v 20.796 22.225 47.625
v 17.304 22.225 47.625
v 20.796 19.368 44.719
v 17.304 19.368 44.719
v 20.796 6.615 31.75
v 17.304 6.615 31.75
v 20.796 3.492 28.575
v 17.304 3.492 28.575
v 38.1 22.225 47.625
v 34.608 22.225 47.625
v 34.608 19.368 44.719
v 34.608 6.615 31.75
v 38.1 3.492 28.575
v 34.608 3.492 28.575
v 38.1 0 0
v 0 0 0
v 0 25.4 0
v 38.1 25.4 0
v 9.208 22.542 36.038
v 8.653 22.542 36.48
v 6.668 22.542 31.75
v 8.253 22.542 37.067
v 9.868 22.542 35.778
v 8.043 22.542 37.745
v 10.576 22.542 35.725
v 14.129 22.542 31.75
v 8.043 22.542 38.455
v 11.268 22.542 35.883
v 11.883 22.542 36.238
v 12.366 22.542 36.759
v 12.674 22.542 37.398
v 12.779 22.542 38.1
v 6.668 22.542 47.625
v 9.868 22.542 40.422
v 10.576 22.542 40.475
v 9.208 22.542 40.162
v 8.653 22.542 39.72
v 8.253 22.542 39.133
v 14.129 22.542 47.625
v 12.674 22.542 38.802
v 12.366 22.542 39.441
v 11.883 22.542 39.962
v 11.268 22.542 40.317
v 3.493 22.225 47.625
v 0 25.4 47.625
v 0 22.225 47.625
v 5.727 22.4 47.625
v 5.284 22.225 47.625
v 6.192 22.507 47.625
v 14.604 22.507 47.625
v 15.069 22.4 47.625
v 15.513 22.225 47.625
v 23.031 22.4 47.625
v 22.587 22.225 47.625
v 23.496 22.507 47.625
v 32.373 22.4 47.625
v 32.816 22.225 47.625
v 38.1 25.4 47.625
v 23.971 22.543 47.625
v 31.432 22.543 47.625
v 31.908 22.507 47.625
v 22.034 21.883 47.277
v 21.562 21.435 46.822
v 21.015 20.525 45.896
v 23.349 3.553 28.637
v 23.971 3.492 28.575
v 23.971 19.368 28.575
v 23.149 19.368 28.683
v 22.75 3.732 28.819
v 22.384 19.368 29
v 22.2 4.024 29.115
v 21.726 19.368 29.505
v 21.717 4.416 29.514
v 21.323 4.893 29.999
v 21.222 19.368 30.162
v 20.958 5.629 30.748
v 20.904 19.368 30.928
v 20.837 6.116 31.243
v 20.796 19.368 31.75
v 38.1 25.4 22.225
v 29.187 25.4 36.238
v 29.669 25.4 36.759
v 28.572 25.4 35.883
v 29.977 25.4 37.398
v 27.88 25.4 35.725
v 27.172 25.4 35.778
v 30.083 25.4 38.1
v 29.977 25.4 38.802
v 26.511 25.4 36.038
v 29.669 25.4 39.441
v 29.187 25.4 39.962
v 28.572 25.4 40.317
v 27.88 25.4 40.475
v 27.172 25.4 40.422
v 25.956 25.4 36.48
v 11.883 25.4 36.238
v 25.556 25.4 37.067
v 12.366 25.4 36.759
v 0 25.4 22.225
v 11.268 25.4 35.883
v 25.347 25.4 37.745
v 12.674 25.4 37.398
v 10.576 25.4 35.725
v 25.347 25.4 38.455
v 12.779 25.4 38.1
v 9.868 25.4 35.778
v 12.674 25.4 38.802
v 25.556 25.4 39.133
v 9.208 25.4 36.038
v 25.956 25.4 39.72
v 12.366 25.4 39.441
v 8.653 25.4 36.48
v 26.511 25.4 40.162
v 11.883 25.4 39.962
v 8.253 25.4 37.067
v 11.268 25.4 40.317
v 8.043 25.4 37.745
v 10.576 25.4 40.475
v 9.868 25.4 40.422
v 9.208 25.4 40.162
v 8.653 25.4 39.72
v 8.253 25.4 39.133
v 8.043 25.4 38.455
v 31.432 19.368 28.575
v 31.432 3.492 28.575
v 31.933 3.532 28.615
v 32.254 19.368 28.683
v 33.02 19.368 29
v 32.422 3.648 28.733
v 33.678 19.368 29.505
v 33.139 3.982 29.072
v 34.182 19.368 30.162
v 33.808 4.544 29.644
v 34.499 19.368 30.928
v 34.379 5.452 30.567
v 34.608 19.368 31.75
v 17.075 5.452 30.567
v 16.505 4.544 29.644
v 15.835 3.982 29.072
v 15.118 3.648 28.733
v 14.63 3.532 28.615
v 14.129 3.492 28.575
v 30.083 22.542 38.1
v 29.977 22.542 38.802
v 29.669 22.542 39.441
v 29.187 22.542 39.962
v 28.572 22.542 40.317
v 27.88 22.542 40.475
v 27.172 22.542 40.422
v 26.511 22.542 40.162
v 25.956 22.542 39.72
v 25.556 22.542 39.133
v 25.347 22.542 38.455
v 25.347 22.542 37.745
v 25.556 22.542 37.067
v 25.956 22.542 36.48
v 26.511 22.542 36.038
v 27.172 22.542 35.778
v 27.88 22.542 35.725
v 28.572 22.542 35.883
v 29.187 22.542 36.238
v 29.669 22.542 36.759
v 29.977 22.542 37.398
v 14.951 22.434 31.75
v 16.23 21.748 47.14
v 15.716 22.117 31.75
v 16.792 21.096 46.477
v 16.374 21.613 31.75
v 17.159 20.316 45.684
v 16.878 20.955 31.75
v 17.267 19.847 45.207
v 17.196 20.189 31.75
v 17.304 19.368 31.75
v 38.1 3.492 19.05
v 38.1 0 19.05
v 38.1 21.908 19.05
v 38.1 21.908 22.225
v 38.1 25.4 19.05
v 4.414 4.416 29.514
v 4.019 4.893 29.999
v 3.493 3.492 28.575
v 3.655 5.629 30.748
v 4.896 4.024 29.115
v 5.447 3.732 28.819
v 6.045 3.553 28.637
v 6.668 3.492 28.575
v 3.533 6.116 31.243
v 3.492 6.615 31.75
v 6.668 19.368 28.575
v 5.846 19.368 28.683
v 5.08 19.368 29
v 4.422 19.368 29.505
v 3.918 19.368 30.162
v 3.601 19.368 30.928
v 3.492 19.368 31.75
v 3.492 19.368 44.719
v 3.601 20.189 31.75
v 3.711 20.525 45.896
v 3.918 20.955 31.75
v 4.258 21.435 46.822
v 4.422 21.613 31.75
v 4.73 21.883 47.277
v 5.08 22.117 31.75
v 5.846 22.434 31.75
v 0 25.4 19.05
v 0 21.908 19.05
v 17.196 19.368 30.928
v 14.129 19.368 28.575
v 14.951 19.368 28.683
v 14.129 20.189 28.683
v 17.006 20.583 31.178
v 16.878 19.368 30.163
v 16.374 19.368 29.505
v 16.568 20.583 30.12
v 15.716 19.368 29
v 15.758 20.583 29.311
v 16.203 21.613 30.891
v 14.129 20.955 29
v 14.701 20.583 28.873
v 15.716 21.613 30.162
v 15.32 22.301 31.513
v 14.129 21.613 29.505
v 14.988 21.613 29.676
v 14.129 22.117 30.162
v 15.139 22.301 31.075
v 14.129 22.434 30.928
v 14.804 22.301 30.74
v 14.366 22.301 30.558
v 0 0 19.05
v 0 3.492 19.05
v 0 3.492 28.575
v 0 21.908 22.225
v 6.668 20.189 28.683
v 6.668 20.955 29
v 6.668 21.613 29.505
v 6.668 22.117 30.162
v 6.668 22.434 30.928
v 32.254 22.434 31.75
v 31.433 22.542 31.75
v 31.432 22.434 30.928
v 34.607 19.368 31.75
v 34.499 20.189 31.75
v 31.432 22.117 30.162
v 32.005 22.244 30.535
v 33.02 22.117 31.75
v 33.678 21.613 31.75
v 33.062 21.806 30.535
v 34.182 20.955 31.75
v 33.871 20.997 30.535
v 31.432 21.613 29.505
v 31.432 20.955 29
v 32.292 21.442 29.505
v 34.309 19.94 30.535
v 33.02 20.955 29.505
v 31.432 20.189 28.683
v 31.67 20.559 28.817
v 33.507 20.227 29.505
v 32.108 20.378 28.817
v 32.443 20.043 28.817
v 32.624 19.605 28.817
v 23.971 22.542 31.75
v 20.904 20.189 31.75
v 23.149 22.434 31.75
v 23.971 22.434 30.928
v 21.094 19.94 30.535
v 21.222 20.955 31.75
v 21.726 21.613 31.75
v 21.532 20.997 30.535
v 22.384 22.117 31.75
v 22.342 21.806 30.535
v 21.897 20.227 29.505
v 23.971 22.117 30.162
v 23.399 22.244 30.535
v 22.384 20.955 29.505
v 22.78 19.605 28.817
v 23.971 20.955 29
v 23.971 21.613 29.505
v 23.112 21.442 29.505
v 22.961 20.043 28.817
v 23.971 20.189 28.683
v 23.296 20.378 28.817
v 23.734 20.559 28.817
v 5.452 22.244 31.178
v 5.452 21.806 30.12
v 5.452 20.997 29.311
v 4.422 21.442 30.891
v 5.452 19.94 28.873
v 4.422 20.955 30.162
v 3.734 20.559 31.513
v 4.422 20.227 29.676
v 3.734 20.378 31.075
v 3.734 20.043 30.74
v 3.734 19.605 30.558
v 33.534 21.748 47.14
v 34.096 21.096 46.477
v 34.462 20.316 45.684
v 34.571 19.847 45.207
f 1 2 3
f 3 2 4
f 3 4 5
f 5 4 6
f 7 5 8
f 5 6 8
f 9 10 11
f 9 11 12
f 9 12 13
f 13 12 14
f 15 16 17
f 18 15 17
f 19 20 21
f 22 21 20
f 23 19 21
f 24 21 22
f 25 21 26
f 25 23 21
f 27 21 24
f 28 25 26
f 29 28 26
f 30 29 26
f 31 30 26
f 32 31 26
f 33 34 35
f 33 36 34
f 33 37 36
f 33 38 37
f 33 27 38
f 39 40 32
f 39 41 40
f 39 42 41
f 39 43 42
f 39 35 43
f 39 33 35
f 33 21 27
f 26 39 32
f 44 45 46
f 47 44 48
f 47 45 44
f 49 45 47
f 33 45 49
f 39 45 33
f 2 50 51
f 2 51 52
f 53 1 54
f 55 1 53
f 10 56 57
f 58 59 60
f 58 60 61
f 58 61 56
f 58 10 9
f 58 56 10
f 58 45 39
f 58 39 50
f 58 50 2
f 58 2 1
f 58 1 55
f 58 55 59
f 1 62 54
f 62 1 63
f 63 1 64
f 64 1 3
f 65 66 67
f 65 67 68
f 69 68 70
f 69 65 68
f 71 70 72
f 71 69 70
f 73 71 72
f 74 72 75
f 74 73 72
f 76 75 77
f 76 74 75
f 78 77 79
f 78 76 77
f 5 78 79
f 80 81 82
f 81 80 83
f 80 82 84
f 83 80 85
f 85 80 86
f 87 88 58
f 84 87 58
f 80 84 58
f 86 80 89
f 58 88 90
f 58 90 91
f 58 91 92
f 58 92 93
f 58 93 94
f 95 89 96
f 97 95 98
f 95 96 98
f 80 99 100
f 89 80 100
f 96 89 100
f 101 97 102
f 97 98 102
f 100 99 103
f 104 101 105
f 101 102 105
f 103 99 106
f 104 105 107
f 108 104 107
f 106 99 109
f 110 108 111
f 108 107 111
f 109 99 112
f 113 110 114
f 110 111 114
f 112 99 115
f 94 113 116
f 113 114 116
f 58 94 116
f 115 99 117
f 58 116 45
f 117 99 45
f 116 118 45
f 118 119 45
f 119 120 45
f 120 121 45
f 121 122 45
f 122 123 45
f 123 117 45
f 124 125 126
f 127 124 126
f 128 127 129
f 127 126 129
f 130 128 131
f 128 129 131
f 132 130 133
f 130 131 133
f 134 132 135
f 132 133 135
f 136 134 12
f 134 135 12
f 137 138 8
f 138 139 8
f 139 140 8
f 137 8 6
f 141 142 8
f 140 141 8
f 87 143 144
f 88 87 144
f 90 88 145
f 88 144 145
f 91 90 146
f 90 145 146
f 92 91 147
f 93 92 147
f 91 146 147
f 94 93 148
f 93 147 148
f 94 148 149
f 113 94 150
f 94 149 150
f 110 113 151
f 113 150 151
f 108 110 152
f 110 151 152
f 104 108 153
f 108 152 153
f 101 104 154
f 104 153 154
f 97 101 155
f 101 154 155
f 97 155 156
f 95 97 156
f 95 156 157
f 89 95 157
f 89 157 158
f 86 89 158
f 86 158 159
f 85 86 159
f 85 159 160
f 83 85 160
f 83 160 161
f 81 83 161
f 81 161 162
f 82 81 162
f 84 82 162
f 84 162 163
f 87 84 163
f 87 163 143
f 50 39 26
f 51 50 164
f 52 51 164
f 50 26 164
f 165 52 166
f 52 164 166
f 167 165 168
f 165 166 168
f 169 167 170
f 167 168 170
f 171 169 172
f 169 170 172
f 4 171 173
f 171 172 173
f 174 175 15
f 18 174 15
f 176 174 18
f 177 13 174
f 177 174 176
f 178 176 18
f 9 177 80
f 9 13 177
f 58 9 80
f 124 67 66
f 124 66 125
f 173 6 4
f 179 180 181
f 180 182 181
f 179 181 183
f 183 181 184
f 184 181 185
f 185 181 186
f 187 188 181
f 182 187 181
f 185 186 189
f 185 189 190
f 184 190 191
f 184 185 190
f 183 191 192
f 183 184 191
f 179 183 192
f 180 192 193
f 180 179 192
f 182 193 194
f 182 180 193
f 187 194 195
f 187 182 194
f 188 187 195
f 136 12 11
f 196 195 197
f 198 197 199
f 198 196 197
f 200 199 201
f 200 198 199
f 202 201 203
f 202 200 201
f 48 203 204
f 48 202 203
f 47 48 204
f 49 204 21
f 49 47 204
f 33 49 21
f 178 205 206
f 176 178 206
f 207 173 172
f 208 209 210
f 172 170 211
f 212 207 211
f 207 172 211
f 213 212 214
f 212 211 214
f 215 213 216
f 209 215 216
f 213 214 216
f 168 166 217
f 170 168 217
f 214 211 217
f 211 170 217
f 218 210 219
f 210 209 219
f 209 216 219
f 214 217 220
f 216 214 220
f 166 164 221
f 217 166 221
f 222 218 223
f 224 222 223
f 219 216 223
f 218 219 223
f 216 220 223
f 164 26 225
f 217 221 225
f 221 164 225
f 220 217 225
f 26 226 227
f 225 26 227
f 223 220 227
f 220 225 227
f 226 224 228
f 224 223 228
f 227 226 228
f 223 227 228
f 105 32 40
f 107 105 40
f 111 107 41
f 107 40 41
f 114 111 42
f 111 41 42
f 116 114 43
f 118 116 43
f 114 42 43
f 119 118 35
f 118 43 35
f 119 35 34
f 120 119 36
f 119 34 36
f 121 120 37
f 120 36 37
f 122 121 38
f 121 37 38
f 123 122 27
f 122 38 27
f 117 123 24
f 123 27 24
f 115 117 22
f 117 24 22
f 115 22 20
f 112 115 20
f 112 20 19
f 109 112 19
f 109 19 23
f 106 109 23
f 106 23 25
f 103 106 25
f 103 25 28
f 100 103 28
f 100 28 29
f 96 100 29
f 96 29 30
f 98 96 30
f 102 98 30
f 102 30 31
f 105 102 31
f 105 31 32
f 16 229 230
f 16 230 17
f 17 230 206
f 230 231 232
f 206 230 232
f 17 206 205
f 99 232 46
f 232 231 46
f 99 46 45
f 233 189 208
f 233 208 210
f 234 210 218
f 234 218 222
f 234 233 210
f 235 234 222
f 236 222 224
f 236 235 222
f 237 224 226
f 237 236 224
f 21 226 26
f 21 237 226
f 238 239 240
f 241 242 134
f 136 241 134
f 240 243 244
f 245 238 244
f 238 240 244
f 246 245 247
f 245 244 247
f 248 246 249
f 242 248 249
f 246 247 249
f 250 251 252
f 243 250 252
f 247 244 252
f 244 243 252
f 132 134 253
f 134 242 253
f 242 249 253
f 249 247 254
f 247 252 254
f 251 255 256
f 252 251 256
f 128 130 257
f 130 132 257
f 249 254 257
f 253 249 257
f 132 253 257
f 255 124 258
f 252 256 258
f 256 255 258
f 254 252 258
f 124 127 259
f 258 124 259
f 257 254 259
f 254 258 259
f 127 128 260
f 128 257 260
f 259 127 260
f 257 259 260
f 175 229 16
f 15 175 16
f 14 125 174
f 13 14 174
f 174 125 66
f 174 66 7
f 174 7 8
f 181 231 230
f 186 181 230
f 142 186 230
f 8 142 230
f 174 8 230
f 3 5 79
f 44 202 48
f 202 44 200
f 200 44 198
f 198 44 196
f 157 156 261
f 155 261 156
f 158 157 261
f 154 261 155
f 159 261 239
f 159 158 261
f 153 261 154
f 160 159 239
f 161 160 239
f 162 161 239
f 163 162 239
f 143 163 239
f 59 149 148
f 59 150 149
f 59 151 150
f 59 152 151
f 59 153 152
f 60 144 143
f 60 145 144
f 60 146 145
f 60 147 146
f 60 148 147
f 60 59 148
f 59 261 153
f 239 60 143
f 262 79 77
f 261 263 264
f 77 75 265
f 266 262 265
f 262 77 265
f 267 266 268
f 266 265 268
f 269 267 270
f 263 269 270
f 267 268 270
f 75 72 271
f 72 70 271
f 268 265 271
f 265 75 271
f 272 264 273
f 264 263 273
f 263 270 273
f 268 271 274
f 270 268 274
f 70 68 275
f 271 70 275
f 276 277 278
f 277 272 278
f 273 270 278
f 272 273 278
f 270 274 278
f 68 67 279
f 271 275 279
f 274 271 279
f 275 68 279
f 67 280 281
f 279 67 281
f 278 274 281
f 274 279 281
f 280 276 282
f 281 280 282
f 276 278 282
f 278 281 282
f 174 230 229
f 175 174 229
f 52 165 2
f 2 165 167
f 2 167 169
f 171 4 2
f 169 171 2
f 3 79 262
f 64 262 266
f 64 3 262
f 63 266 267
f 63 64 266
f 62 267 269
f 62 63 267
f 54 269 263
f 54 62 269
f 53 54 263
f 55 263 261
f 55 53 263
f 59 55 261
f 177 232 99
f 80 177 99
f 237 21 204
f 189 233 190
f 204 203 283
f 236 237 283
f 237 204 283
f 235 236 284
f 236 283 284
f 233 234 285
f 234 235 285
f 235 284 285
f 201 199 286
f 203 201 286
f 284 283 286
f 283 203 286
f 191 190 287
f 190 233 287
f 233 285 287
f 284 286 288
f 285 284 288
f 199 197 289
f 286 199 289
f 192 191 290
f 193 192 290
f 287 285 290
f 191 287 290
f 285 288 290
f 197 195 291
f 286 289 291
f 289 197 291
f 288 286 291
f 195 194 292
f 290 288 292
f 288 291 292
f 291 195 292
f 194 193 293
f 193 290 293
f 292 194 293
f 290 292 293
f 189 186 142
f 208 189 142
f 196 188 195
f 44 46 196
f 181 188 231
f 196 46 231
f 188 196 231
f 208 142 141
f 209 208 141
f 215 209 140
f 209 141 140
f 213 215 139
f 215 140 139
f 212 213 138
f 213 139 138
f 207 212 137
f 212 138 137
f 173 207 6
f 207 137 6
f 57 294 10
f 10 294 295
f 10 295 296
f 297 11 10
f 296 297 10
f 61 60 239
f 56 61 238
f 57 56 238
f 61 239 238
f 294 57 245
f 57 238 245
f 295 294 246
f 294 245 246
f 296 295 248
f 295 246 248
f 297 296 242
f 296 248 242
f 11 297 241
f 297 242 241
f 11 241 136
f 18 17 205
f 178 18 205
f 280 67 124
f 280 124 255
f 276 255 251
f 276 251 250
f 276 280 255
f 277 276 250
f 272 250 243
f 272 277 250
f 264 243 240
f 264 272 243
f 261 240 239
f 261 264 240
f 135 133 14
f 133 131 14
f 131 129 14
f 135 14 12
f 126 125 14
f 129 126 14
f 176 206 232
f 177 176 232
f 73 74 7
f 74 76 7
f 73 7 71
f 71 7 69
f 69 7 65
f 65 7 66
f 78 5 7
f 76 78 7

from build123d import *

# Parameters (mm, degrees)
F1_DEPTH     = 38.1
F2_W         = 13.81125
F2_H         = 19.05
F3_DEPTH     = 19.05
F4_T1_DEPTH  = 7.46125
F4_T3_DEPTH  = 7.46125
F4_S7_W      = 3.175
F4_S7_H      = 3.175
F4_T8_DEPTH  = 3.175
F4_S13_W     = 3.175
F4_S13_H     = 3.175
F4_T14_DEPTH = 3.175
F4_S19_W     = 3.175
F4_S19_H     = 3.175
F4_T20_DEPTH = 3.175
F4_S25_W     = 3.175
F4_S25_H     = 3.175
F4_T26_DEPTH = 3.175
F4_T32_DEPTH = 15.875
F4_T37_DEPTH = 15.875
F4_T42_DEPTH = 15.875
F4_T47_DEPTH = 15.875
F4_T52_DEPTH = 15.875
F4_T57_DEPTH = 15.875
F4_T62_DEPTH = 15.875
F4_T67_DEPTH = 15.875
F6_DEPTH     = 2.8585


# Not quite as in the source:
# - a fillet or chamfer that OpenCascade refuses, or shapes differently, is made with other operations: its cross-section is extruded or revolved along the edge and cut away or added


with BuildPart() as f1:
    # F0 (on Right) → F1 (new body)
    with BuildSketch(Plane.YZ):
        Polygon((0, 19.05), (0, 0), (25.4, 0), (25.4, 19.05), (21.9075, 19.05), (21.9075, 22.225), (25.4, 22.225), (25.4, 47.625), (22.225, 47.625), (22.225, 28.575), (3.4925, 28.575), (3.4925, 19.05), align=None)
        Polygon((22.225, 47.625), (3.4925, 28.575), (22.225, 28.575), align=None)
    extrude(amount=F1_DEPTH)

    # F2 (on face) → F3 (cut)
    with BuildSketch(Plane.XZ.offset(-3.4925)):
        with Locations((27.701875, 38.1)):
            Rectangle(F2_W, F2_H)
        with Locations((10.398125, 38.1)):
            Rectangle(F2_W, F2_H)
    extrude(amount=-F3_DEPTH, mode=Mode.SUBTRACT)

    # F4: fillet of radius 3.175 on 10 edges, made by hand

    # F4_s2 → F4_t1 (join)
    with BuildSketch(Plane.YZ.offset(6.6675)):
        with BuildLine():
            ThreePointArc((19.3675, 28.575), (21.6125640303, 29.5049359697), (22.5425, 31.75))
            Line((22.5425, 31.75), (22.5425, 28.575))
            Line((22.5425, 28.575), (19.3675, 28.575))
        make_face()
    extrude(amount=F4_T1_DEPTH)

    # F4_s4 → F4_t3 (join)
    with BuildSketch(Plane.YZ.offset(23.97125)):
        with BuildLine():
            ThreePointArc((19.3675, 28.575), (21.6125640303, 29.5049359697), (22.5425, 31.75))
            Line((22.5425, 31.75), (22.5425, 28.575))
            Line((22.5425, 28.575), (19.3675, 28.575))
        make_face()
    extrude(amount=F4_T3_DEPTH)


with BuildPart() as f4_tool6:
    # F4_s7 → F4_t8 (new body)
    with BuildSketch(Plane.YZ.offset(6.6675)):
        with Locations((20.955, 30.1625)):
            Rectangle(F4_S7_W, F4_S7_H)
    extrude(amount=-F4_T8_DEPTH)

    # F4_s9 → F4_t10 (revolve, cut)
    with BuildSketch(Plane(origin=(6.6675, 19.3675, 31.75), x_dir=(0, -0.7071067812, 0.7071067812), z_dir=(0, -0.7071067812, -0.7071067812))):
        with BuildLine():
            ThreePointArc((0, -3.175), (3.175, 0), (0, 3.175))
            Line((0, 3.175), (0, -3.175))
        make_face()
    revolve(axis=Axis((6.6675, 19.3675, 31.75), (-1, 0, 0)), mode=Mode.SUBTRACT)


with BuildPart() as f1_1:
    add(f1.part)

    # F4_t5: union F4_tool6
    add(f4_tool6.part)


with BuildPart() as f4_tool12:
    # F4_s13 → F4_t14 (new body)
    with BuildSketch(Plane.XZ.offset(-19.3675)):
        with Locations((15.71625, 30.1625)):
            Rectangle(F4_S13_W, F4_S13_H)
    extrude(amount=-F4_T14_DEPTH)

    # F4_s15 → F4_t16 (revolve, cut)
    with BuildSketch(Plane(origin=(14.12875, 19.3675, 31.75), x_dir=(-0.7071067812, 0, 0.7071067812), z_dir=(-0.7071067812, 0, -0.7071067812))):
        with BuildLine():
            ThreePointArc((0, -3.175), (3.175, 0), (0, 3.175))
            Line((0, 3.175), (0, -3.175))
        make_face()
    revolve(axis=Axis((14.12875, 19.3675, 31.75), (0, 1, 0)), mode=Mode.SUBTRACT)


with BuildPart() as f1_2:
    add(f1_1.part)

    # F4_t11: union F4_tool12
    add(f4_tool12.part)


with BuildPart() as f4_tool18:
    # F4_s19 → F4_t20 (new body)
    with BuildSketch(Plane.XY.offset(31.75)):
        with Locations((22.38375, 20.955)):
            Rectangle(F4_S19_W, F4_S19_H)
    extrude(amount=-F4_T20_DEPTH)

    # F4_s21 → F4_t22 (revolve, cut)
    with BuildSketch(Plane(origin=(23.97125, 19.3675, 31.75), x_dir=(0.7071067812, -0.7071067812, 0), z_dir=(0.7071067812, 0.7071067812, 0))):
        with BuildLine():
            ThreePointArc((0, -3.175), (3.175, 0), (0, 3.175))
            Line((0, 3.175), (0, -3.175))
        make_face()
    revolve(axis=Axis((23.97125, 19.3675, 31.75), (0, 0, -1)), mode=Mode.SUBTRACT)


with BuildPart() as f1_3:
    add(f1_2.part)

    # F4_t17: union F4_tool18
    add(f4_tool18.part)


with BuildPart() as f4_tool24:
    # F4_s25 → F4_t26 (new body)
    with BuildSketch(Plane.XY.offset(31.75)):
        with Locations((33.02, 20.955)):
            Rectangle(F4_S25_W, F4_S25_H)
    extrude(amount=-F4_T26_DEPTH)

    # F4_s27 → F4_t28 (revolve, cut)
    with BuildSketch(Plane(origin=(31.4325, 19.3675, 31.75), x_dir=(-0.7071067812, -0.7071067812, 0), z_dir=(0.7071067812, -0.7071067812, 0))):
        with BuildLine():
            ThreePointArc((0, -3.175), (3.175, 0), (0, 3.175))
            Line((0, 3.175), (0, -3.175))
        make_face()
    revolve(axis=Axis((31.4325, 19.3675, 31.75), (0, 0, -1)), mode=Mode.SUBTRACT)


with BuildPart() as f1_4:
    add(f1_3.part)

    # F4_t23: union F4_tool24
    add(f4_tool24.part)


with BuildPart() as f4_tool30:
    # F4_s31 → F4_t32 (new body)
    with BuildSketch(Plane.XY.offset(47.625)):
        with BuildLine():
            ThreePointArc((20.79625, 19.3675), (21.7261859697, 21.6125640303), (23.97125, 22.5425))
            Line((23.97125, 22.5425), (20.79625, 22.5425))
            Line((20.79625, 22.5425), (20.79625, 19.3675))
        make_face()
    extrude(amount=-F4_T32_DEPTH)

    split(bisect_by=Plane(origin=(0, -12.5098856094, 12.3013875159), x_dir=(1, 0, 0), z_dir=(0, 0.7130236798, -0.7011399518)), keep=Keep.TOP)


with BuildPart() as f1_5:
    add(f1_4.part)

    # F4_t29: union F4_tool30
    add(f4_tool30.part)


with BuildPart() as f4_tool35:
    # F4_s36 → F4_t37 (new body)
    with BuildSketch(Plane.XZ.offset(-3.4925)):
        with BuildLine():
            ThreePointArc((23.97125, 28.575), (21.7261859697, 29.5049359697), (20.79625, 31.75))
            Line((20.79625, 31.75), (20.79625, 28.575))
            Line((20.79625, 28.575), (23.97125, 28.575))
        make_face()
    extrude(amount=-F4_T37_DEPTH)

    split(bisect_by=Plane(origin=(0, -12.5098856094, 12.3013875159), x_dir=(1, 0, 0), z_dir=(0, 0.7130236798, -0.7011399518)), keep=Keep.TOP)


with BuildPart() as f1_6:
    add(f1_5.part)

    # F4_t34: union F4_tool35
    add(f4_tool35.part)


with BuildPart() as f4_tool40:
    # F4_s41 → F4_t42 (new body)
    with BuildSketch(Plane.XY.offset(47.625)):
        with BuildLine():
            ThreePointArc((3.4925, 19.3675), (4.4224359697, 21.6125640303), (6.6675, 22.5425))
            Line((6.6675, 22.5425), (3.4925, 22.5425))
            Line((3.4925, 22.5425), (3.4925, 19.3675))
        make_face()
    extrude(amount=-F4_T42_DEPTH)

    split(bisect_by=Plane(origin=(0, -12.5098856094, 12.3013875159), x_dir=(1, 0, 0), z_dir=(0, 0.7130236798, -0.7011399518)), keep=Keep.TOP)


with BuildPart() as f1_7:
    add(f1_6.part)

    # F4_t39: union F4_tool40
    add(f4_tool40.part)


with BuildPart() as f4_tool45:
    # F4_s46 → F4_t47 (new body)
    with BuildSketch(Plane.XZ.offset(-3.4925)):
        with BuildLine():
            ThreePointArc((6.6675, 28.575), (4.4224359697, 29.5049359697), (3.4925, 31.75))
            Line((3.4925, 31.75), (3.4925, 28.575))
            Line((3.4925, 28.575), (6.6675, 28.575))
        make_face()
    extrude(amount=-F4_T47_DEPTH)

    split(bisect_by=Plane(origin=(0, -12.5098856094, 12.3013875159), x_dir=(1, 0, 0), z_dir=(0, 0.7130236798, -0.7011399518)), keep=Keep.TOP)


with BuildPart() as f1_8:
    add(f1_7.part)

    # F4_t44: union F4_tool45
    add(f4_tool45.part)


with BuildPart() as f4_tool50:
    # F4_s51 → F4_t52 (new body)
    with BuildSketch(Plane.XZ.offset(-3.4925)):
        with BuildLine():
            ThreePointArc((31.4325, 28.575), (33.6775640303, 29.5049359697), (34.6075, 31.75))
            Line((34.6075, 31.75), (34.6075, 28.575))
            Line((34.6075, 28.575), (31.4325, 28.575))
        make_face()
    extrude(amount=-F4_T52_DEPTH)

    split(bisect_by=Plane(origin=(0, -12.5098856094, 12.3013875159), x_dir=(1, 0, 0), z_dir=(0, 0.7130236798, -0.7011399518)), keep=Keep.TOP)


with BuildPart() as f1_9:
    add(f1_8.part)

    # F4_t49: union F4_tool50
    add(f4_tool50.part)


with BuildPart() as f4_tool55:
    # F4_s56 → F4_t57 (new body)
    with BuildSketch(Plane.XY.offset(31.75)):
        with BuildLine():
            ThreePointArc((31.4325, 22.5425), (33.6775640303, 21.6125640303), (34.6075, 19.3675))
            Line((34.6075, 19.3675), (34.6075, 22.5425))
            Line((34.6075, 22.5425), (31.4325, 22.5425))
        make_face()
    extrude(amount=F4_T57_DEPTH)

    split(bisect_by=Plane(origin=(0, -12.5098856094, 12.3013875159), x_dir=(1, 0, 0), z_dir=(0, 0.7130236798, -0.7011399518)), keep=Keep.TOP)


with BuildPart() as f1_10:
    add(f1_9.part)

    # F4_t54: union F4_tool55
    add(f4_tool55.part)


with BuildPart() as f4_tool60:
    # F4_s61 → F4_t62 (new body)
    with BuildSketch(Plane.XZ.offset(-3.4925)):
        with BuildLine():
            ThreePointArc((14.12875, 28.575), (16.3738140303, 29.5049359697), (17.30375, 31.75))
            Line((17.30375, 31.75), (17.30375, 28.575))
            Line((17.30375, 28.575), (14.12875, 28.575))
        make_face()
    extrude(amount=-F4_T62_DEPTH)

    split(bisect_by=Plane(origin=(0, -12.5098856094, 12.3013875159), x_dir=(1, 0, 0), z_dir=(0, 0.7130236798, -0.7011399518)), keep=Keep.TOP)


with BuildPart() as f1_11:
    add(f1_10.part)

    # F4_t59: union F4_tool60
    add(f4_tool60.part)


with BuildPart() as f4_tool65:
    # F4_s66 → F4_t67 (new body)
    with BuildSketch(Plane.XY.offset(31.75)):
        with BuildLine():
            ThreePointArc((14.12875, 22.5425), (16.3738140303, 21.6125640303), (17.30375, 19.3675))
            Line((17.30375, 19.3675), (17.30375, 22.5425))
            Line((17.30375, 22.5425), (14.12875, 22.5425))
        make_face()
    extrude(amount=F4_T67_DEPTH)

    split(bisect_by=Plane(origin=(0, -12.5098856094, 12.3013875159), x_dir=(1, 0, 0), z_dir=(0, 0.7130236798, -0.7011399518)), keep=Keep.TOP)


with BuildPart() as f1_12:
    add(f1_11.part)

    # F4_t64: union F4_tool65
    add(f4_tool65.part)

    # F5 (on face) → F6 (cut, through all)
    with BuildSketch(Plane.XZ.offset(-22.5425)):
        with BuildLine():
            ThreePointArc((10.398125, 35.71875), (12.0819230227, 36.4162019773), (12.779375, 38.1))
            ThreePointArc((12.779375, 38.1), (8.7143269773, 39.7837980227), (10.398125, 35.71875))
        make_face()
        with BuildLine():
            ThreePointArc((27.701875, 35.71875), (29.3856730227, 36.4162019773), (30.083125, 38.1))
            ThreePointArc((30.083125, 38.1), (26.0180769773, 39.7837980227), (27.701875, 35.71875))
        make_face()
    extrude(amount=-F6_DEPTH, mode=Mode.SUBTRACT)


solid = f1_12.part
